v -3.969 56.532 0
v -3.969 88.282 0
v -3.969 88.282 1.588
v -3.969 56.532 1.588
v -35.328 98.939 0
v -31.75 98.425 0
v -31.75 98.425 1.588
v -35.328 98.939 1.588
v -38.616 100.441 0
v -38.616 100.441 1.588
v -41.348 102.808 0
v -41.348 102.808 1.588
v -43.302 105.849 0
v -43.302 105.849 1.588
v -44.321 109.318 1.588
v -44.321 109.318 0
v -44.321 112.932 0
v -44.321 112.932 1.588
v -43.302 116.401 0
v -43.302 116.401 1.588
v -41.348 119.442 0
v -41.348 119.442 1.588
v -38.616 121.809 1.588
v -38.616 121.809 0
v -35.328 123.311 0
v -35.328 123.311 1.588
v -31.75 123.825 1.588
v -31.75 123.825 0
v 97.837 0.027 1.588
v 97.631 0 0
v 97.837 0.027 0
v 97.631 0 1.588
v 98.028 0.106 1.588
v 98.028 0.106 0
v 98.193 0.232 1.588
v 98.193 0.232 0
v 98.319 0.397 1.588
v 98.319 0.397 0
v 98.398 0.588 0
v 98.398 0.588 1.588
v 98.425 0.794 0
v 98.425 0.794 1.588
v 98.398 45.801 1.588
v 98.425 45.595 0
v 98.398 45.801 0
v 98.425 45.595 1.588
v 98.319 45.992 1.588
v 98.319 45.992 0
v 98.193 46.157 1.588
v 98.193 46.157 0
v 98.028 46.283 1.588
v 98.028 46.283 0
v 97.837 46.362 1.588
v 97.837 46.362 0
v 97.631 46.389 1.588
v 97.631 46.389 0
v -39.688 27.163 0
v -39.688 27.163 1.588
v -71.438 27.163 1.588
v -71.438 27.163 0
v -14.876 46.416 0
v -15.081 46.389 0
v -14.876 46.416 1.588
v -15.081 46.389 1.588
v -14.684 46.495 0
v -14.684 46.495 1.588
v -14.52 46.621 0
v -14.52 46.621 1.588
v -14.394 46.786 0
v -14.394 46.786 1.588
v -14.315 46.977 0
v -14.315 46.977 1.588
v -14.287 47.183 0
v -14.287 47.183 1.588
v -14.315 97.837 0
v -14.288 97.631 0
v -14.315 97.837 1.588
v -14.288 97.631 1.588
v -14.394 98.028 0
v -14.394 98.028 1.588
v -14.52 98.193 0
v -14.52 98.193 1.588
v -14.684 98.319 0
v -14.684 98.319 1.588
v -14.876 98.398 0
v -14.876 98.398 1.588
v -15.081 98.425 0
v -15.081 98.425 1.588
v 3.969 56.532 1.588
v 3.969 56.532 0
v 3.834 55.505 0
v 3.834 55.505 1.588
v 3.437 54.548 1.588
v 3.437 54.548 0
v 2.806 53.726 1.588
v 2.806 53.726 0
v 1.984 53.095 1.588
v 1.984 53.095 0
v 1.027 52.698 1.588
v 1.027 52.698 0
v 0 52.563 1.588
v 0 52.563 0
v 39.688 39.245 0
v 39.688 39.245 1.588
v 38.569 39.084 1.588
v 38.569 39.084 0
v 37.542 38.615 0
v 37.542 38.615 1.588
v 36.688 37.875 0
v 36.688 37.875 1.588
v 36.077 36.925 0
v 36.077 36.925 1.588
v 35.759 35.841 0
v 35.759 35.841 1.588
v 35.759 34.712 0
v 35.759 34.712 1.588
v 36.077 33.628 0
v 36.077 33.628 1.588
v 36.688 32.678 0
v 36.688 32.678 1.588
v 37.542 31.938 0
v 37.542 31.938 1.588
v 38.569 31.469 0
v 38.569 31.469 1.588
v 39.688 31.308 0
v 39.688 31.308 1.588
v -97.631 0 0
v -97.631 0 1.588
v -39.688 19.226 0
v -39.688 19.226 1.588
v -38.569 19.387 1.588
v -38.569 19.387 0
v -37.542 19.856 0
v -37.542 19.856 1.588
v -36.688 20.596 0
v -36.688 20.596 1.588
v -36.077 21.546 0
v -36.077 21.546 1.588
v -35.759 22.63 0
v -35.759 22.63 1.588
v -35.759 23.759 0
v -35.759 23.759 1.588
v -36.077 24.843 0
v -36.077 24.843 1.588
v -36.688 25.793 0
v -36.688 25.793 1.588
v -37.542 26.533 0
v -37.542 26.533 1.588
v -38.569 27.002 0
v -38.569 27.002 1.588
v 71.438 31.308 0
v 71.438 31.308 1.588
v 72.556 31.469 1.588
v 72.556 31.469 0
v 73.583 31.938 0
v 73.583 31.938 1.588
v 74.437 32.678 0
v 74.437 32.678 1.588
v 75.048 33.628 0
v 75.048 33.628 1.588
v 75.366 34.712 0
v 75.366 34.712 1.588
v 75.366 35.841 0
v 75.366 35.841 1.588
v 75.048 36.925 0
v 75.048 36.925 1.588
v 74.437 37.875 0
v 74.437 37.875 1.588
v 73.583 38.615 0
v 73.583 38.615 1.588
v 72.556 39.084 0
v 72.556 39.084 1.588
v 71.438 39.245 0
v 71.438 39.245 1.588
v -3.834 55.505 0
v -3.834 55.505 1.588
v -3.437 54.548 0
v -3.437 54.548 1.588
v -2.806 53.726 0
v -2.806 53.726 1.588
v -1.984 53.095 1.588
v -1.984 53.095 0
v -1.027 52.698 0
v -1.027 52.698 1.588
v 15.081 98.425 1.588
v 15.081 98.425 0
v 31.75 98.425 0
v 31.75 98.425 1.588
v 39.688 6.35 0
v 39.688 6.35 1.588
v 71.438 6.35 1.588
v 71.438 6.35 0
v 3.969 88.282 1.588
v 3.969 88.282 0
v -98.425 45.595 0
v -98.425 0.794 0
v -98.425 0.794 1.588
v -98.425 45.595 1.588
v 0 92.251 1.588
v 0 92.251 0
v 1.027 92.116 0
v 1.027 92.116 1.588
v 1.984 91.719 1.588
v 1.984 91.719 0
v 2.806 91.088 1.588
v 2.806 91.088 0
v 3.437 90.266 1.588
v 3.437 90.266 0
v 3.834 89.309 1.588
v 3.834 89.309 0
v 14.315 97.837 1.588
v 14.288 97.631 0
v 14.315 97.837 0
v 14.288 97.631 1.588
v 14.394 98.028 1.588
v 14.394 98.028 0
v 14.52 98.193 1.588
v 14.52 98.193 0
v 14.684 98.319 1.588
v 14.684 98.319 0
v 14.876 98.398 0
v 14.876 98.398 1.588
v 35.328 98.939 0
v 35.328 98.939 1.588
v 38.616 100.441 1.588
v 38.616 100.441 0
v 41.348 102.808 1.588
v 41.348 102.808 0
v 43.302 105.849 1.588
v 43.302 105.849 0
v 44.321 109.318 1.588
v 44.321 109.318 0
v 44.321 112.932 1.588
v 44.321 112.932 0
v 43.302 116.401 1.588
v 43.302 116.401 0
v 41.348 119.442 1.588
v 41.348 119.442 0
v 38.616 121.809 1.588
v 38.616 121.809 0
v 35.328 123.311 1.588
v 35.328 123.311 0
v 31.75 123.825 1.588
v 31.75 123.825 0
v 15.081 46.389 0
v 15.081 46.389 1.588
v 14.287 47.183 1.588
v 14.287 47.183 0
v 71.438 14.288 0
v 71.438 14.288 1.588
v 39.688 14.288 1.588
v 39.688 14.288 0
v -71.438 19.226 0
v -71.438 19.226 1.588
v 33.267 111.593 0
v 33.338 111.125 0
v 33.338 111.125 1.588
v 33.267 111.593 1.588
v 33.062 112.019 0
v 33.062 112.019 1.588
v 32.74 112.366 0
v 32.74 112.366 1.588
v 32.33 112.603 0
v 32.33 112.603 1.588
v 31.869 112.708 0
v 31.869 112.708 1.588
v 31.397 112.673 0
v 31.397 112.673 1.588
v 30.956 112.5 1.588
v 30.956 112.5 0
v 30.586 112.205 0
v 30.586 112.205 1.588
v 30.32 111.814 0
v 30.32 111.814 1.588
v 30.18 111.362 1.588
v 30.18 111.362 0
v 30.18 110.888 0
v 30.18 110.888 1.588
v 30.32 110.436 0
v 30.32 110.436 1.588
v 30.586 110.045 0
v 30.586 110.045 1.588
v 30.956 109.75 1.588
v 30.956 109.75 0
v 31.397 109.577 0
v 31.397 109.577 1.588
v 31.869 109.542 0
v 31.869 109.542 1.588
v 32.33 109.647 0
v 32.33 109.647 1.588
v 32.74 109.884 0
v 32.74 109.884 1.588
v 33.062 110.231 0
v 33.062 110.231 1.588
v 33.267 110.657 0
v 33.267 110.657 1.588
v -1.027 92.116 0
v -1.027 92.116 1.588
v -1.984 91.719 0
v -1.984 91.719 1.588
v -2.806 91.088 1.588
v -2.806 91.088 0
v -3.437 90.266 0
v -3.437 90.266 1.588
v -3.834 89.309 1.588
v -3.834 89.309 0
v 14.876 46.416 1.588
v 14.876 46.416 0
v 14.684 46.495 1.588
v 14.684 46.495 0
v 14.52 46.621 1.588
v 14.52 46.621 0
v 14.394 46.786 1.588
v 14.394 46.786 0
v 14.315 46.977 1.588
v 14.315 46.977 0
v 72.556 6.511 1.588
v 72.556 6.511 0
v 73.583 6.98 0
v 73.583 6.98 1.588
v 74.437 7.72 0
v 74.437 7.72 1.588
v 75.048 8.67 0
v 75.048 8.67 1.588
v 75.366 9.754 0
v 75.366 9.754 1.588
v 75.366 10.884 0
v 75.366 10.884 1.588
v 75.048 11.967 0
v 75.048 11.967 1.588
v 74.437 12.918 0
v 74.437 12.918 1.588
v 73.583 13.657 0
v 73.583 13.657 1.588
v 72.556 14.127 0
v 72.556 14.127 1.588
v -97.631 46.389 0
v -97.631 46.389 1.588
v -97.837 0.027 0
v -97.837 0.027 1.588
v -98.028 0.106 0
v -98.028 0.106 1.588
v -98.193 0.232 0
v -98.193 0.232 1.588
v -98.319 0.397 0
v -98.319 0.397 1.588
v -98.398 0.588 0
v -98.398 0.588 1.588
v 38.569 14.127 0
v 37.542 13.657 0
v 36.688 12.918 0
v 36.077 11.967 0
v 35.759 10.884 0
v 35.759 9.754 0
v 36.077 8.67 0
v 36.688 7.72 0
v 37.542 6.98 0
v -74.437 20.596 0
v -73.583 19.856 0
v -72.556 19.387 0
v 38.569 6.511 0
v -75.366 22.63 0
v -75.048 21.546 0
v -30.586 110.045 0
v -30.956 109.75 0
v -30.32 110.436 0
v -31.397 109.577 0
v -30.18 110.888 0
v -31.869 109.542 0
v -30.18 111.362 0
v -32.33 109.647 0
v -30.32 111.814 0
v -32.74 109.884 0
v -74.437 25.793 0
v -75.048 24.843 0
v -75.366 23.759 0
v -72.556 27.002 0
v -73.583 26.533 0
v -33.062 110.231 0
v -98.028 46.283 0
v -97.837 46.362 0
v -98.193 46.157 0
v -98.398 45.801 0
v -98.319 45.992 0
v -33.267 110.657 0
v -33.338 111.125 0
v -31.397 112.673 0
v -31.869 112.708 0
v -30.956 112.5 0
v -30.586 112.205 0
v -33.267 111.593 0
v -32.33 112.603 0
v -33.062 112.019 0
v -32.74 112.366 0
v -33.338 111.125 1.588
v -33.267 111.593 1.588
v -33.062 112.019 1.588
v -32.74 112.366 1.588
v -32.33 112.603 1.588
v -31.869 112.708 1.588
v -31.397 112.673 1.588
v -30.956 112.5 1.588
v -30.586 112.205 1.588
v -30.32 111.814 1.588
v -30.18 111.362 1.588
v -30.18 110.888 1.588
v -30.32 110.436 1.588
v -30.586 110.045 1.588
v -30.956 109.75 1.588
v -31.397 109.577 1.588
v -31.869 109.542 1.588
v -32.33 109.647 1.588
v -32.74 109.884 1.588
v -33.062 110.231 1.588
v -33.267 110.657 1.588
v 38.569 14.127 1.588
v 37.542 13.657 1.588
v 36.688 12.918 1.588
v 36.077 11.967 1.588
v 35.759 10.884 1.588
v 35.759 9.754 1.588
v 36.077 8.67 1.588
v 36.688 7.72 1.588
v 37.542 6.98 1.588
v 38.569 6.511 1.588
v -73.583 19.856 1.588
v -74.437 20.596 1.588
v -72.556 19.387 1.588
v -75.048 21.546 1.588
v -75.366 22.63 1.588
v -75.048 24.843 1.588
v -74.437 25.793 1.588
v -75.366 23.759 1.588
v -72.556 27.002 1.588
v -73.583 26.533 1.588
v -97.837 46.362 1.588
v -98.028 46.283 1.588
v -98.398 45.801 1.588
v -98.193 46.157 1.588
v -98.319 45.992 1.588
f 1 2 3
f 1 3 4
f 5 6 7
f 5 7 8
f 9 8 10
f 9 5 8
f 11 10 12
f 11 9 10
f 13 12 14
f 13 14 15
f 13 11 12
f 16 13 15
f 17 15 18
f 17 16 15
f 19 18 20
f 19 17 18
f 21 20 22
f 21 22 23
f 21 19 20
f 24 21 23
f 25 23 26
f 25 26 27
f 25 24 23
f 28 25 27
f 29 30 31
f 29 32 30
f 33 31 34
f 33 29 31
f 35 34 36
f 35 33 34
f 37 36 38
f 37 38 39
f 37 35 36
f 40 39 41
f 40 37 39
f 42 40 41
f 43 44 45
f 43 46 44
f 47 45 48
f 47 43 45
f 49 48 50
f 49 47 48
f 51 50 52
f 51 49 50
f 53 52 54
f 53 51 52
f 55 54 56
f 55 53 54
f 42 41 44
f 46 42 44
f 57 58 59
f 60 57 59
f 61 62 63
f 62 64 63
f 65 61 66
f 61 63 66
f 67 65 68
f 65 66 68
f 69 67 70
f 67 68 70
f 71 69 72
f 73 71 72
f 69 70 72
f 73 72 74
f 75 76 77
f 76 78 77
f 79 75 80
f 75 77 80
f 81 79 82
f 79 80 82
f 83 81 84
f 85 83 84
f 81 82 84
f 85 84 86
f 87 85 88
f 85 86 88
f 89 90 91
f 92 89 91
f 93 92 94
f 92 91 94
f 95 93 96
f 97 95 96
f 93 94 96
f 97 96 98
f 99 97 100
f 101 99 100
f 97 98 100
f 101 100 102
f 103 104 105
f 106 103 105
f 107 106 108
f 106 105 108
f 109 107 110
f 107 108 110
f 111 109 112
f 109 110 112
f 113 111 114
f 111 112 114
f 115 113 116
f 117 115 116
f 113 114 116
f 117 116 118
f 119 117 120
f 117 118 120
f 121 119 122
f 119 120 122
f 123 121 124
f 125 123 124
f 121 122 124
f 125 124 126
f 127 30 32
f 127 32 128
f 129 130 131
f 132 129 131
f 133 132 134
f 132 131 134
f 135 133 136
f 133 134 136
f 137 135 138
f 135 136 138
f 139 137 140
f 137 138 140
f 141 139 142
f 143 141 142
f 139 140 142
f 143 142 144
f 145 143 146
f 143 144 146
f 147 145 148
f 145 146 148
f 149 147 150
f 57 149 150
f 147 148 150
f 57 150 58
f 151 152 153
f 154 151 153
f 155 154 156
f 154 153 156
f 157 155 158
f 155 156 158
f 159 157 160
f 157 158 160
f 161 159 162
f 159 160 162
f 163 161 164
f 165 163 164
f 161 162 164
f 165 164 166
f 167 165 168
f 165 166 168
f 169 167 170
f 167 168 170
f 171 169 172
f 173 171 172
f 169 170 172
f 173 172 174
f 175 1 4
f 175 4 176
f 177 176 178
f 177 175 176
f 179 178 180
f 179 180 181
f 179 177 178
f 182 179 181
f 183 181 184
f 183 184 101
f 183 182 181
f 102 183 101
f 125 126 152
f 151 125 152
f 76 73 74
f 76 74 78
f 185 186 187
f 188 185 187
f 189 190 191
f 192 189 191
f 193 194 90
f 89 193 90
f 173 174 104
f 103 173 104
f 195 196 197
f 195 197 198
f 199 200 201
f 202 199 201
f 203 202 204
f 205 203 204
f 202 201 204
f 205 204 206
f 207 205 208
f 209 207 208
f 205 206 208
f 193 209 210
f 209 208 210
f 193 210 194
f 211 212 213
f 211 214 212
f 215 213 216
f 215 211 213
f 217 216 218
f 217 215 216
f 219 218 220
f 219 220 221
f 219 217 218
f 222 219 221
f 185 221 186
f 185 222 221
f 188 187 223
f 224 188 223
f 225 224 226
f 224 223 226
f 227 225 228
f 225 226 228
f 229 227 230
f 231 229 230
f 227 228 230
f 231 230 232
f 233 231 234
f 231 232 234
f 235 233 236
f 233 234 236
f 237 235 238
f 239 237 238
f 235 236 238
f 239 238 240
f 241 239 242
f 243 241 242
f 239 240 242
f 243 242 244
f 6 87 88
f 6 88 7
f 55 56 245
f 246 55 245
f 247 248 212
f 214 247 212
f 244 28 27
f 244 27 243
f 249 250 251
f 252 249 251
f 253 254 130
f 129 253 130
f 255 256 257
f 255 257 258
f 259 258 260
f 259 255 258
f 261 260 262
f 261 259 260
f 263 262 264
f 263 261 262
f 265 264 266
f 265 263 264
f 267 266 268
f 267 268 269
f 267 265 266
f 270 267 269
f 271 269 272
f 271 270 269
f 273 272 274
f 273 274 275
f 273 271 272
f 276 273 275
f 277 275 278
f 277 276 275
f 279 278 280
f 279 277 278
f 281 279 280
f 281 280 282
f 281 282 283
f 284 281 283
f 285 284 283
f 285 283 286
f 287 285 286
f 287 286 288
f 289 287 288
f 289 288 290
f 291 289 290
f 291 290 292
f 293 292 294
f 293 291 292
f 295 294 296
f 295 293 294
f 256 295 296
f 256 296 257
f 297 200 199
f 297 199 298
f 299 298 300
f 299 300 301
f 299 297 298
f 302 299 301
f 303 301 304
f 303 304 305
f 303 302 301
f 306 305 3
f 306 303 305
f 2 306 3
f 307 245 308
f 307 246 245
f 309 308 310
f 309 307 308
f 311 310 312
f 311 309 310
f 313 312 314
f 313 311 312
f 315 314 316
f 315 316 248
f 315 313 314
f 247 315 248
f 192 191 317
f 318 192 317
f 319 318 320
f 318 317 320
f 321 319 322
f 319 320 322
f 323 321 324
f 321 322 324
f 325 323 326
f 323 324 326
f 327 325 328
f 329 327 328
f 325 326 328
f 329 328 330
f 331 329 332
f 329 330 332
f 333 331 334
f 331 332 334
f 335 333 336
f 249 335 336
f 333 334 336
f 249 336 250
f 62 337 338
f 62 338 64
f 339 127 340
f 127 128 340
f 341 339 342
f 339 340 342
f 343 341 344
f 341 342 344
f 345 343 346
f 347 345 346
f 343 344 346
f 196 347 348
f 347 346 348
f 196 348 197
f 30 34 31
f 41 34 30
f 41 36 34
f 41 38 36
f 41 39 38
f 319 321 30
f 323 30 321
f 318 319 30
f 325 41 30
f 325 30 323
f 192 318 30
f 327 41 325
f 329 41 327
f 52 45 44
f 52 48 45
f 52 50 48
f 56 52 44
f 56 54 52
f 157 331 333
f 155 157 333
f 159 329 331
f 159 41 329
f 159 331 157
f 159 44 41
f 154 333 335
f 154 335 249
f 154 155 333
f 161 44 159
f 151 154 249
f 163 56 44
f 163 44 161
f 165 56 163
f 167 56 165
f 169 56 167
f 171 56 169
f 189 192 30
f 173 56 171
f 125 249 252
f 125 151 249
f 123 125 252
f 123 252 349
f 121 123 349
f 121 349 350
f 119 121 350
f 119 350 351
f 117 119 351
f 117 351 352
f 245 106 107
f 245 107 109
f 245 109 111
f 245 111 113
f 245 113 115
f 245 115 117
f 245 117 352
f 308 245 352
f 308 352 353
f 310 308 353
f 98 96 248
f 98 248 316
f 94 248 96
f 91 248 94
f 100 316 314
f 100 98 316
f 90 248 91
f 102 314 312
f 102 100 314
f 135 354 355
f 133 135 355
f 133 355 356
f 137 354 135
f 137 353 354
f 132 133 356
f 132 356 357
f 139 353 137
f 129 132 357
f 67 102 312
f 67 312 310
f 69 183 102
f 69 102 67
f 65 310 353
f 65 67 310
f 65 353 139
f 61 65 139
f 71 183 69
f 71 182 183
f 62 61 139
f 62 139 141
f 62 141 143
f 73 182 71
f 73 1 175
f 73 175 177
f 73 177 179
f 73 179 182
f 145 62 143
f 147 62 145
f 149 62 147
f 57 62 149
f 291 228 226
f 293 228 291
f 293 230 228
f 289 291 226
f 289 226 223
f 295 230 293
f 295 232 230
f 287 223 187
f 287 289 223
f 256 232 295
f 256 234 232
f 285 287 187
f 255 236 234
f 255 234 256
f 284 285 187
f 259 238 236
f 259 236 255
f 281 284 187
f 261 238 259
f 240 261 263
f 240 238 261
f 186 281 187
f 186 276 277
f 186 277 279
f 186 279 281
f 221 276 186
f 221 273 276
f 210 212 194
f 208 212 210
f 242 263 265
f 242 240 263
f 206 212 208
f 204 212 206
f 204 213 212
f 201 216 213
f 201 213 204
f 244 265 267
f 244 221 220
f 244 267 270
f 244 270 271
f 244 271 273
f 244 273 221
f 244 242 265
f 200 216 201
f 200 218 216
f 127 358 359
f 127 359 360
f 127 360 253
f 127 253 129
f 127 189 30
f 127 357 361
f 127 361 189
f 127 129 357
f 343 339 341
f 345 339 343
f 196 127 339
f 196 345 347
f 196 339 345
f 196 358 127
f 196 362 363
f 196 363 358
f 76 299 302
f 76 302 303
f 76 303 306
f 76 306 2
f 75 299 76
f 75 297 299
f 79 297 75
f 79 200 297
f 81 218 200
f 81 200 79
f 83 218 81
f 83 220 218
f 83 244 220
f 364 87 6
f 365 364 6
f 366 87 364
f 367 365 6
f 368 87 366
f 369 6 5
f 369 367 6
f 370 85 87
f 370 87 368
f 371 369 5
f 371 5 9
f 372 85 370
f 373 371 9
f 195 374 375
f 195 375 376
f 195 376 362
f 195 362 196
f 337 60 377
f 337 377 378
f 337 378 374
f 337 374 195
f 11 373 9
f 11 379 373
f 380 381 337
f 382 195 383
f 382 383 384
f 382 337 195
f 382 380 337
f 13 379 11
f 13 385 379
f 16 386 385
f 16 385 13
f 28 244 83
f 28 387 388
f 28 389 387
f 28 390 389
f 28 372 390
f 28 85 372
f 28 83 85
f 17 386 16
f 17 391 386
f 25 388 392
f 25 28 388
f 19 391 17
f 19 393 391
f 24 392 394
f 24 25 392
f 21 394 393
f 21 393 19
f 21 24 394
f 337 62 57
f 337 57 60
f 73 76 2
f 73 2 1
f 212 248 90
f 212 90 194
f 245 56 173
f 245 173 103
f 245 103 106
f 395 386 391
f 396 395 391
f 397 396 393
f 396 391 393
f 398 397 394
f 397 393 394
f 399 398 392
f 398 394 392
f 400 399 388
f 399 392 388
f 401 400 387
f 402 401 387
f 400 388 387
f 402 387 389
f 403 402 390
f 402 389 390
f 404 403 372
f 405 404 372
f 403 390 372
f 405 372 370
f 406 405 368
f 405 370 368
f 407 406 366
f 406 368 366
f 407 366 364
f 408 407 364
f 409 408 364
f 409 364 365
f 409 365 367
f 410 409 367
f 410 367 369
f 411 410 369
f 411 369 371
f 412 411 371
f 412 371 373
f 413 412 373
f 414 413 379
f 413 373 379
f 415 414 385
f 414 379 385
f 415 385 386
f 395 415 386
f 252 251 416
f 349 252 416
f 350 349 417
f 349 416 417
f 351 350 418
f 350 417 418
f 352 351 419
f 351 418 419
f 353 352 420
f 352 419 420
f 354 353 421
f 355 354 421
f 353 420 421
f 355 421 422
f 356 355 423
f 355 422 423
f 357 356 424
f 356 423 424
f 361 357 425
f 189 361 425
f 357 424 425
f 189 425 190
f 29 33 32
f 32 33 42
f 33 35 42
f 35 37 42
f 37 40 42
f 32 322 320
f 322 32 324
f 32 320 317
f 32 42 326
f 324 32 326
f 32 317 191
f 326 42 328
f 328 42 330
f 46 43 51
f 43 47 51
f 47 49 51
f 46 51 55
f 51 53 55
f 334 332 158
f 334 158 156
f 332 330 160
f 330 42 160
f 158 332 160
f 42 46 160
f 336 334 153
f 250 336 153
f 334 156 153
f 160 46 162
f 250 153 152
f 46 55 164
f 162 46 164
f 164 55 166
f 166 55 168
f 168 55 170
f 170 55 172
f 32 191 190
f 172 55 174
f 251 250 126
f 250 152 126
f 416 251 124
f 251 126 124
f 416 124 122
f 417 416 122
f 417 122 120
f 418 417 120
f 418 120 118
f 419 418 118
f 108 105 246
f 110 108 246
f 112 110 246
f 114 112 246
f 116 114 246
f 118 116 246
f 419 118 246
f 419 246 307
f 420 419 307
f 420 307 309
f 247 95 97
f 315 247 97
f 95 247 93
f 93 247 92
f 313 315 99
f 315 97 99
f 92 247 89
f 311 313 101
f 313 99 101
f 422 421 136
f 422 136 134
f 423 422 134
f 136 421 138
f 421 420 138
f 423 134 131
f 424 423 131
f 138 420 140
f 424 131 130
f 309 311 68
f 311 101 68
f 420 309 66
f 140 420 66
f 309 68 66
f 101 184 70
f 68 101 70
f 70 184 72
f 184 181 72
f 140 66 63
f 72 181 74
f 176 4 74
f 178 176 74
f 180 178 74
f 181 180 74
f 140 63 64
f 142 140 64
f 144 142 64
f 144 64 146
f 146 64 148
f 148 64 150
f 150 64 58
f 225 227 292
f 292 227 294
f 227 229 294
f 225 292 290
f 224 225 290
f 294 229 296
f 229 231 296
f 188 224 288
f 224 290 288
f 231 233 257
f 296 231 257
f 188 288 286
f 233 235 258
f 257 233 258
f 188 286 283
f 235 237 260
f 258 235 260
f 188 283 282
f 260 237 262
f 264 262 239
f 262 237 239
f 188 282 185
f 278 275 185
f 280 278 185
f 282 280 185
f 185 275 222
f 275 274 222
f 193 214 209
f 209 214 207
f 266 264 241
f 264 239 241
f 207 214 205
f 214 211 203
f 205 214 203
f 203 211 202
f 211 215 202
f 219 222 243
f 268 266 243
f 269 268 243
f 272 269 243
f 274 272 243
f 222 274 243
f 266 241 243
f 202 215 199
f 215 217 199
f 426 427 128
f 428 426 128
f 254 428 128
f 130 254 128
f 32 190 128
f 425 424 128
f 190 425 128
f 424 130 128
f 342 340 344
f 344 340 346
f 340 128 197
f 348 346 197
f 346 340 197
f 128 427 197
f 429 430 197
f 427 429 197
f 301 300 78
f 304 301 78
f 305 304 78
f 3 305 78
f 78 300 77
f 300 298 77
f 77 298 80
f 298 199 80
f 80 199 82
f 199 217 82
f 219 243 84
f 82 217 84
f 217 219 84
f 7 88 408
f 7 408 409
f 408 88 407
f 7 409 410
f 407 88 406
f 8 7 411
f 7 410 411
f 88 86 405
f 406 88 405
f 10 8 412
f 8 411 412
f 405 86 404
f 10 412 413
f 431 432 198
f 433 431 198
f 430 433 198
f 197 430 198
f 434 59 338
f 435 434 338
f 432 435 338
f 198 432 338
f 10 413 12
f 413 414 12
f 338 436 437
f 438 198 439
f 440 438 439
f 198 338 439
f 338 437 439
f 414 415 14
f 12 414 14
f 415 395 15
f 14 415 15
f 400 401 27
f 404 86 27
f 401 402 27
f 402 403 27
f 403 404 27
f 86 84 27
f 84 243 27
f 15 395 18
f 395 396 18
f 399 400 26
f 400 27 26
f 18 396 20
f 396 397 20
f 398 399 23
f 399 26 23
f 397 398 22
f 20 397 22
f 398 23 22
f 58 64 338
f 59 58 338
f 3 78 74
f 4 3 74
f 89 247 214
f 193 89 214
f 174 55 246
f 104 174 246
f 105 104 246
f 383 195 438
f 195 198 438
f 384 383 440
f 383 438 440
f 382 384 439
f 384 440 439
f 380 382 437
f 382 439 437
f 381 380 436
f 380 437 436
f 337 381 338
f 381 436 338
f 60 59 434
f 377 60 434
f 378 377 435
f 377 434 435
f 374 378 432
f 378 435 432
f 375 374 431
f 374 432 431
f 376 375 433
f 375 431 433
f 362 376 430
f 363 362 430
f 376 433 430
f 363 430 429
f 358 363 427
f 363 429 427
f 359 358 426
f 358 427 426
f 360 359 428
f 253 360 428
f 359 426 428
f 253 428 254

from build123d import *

# Parameters (mm, degrees)
F0_R     = 1.5875
F1_DEPTH = 1.5875
F2_R     = 0.79375
F5_DEPTH = 1.5885


with BuildPart() as f1:
    # F0 (on Top) → F1 (new body)
    with BuildSketch(Plane.XY):
        with BuildLine():
            Line((0, 52.563247), (0, 0))
            Line((0, 0), (98.425, 0))
            Line((98.425, 0), (98.425, 46.388994))
            Line((98.425, 46.388994), (14.2875, 46.388994))
            Line((14.2875, 46.388994), (14.2875, 98.425))
            Line((14.2875, 98.425), (31.75, 98.425))
            ThreePointArc((31.75, 98.425), (44.45, 111.125), (31.75, 123.825))
            Line((31.75, 123.825), (0, 123.825))
            Line((0, 123.825), (0, 92.250747))
            ThreePointArc((0, 92.250747), (2.80633, 91.088327), (3.96875, 88.281997))
            Line((3.96875, 88.281997), (3.96875, 56.531997))
            ThreePointArc((3.96875, 56.531997), (2.80633, 53.725667), (0, 52.563247))
        make_face()
        with BuildLine():
            Line((71.4375, 6.35), (39.6875, 6.35))
            ThreePointArc((39.6875, 6.35), (35.71875, 10.31875), (39.6875, 14.2875))
            Line((39.6875, 14.2875), (71.4375, 14.2875))
            ThreePointArc((71.4375, 14.2875), (75.40625, 10.31875), (71.4375, 6.35))
        make_face(mode=Mode.SUBTRACT)
        with BuildLine():
            Line((71.4375, 31.307744), (39.6875, 31.307744))
            ThreePointArc((39.6875, 31.307744), (35.71875, 35.276494), (39.6875, 39.245244))
            Line((39.6875, 39.245244), (71.4375, 39.245244))
            ThreePointArc((71.4375, 39.245244), (75.40625, 35.276494), (71.4375, 31.307744))
        make_face(mode=Mode.SUBTRACT)
        with Locations((31.75, 111.125)):
            Circle(F0_R, mode=Mode.SUBTRACT)
        with BuildLine():
            ThreePointArc((39.6875, 39.245244), (35.71875, 35.276494), (39.6875, 31.307744))
            Line((39.6875, 31.307744), (71.4375, 31.307744))
            ThreePointArc((71.4375, 31.307744), (75.40625, 35.276494), (71.4375, 39.245244))
            Line((71.4375, 39.245244), (39.6875, 39.245244))
        make_face()
        with BuildLine():
            ThreePointArc((39.6875, 14.2875), (35.71875, 10.31875), (39.6875, 6.35))
            Line((39.6875, 6.35), (71.4375, 6.35))
            ThreePointArc((71.4375, 6.35), (75.40625, 10.31875), (71.4375, 14.2875))
            Line((71.4375, 14.2875), (39.6875, 14.2875))
        make_face()
    extrude(amount=F1_DEPTH)

    # F2
    f2_edges = [f1.edges().sort_by_distance(p)[0] for p in [
        (14.2875, 98.425, 0.79375),
        (14.2875, 46.388994, 0.79375),
        (98.425, 46.388994, 0.79375),
        (98.425, 0, 0.79375),
    ]]
    fillet(f2_edges, radius=F2_R)

    # F3: F1 across plane


with BuildPart() as f1_1:
    add(f1.part)
    add(f1.part.mirror(Plane.YZ))

    # F4 (on face) → F5 (cut, through all)
    with BuildSketch(Plane.XY.offset(1.5875)):
        with BuildLine():
            ThreePointArc((-71.4375, 27.163247), (-75.40625, 23.194497), (-71.4375, 19.225747))
            Line((-71.4375, 19.225747), (-39.6875, 19.225747))
            ThreePointArc((-39.6875, 19.225747), (-35.71875, 23.194497), (-39.6875, 27.163247))
            Line((-39.6875, 27.163247), (-71.4375, 27.163247))
        make_face()
        with BuildLine():
            Line((71.4375, 39.245244), (39.6875, 39.245244))
            ThreePointArc((39.6875, 39.245244), (35.71875, 35.276494), (39.6875, 31.307744))
            Line((39.6875, 31.307744), (71.4375, 31.307744))
            ThreePointArc((71.4375, 31.307744), (75.40625, 35.276494), (71.4375, 39.245244))
        make_face()
        with BuildLine():
            ThreePointArc((39.6875, 14.2875), (35.71875, 10.31875), (39.6875, 6.35))
            Line((39.6875, 6.35), (71.4375, 6.35))
            ThreePointArc((71.4375, 6.35), (75.40625, 10.31875), (71.4375, 14.2875))
            Line((71.4375, 14.2875), (39.6875, 14.2875))
        make_face()
    extrude(amount=-F5_DEPTH, mode=Mode.SUBTRACT)


solid = f1_1.part
